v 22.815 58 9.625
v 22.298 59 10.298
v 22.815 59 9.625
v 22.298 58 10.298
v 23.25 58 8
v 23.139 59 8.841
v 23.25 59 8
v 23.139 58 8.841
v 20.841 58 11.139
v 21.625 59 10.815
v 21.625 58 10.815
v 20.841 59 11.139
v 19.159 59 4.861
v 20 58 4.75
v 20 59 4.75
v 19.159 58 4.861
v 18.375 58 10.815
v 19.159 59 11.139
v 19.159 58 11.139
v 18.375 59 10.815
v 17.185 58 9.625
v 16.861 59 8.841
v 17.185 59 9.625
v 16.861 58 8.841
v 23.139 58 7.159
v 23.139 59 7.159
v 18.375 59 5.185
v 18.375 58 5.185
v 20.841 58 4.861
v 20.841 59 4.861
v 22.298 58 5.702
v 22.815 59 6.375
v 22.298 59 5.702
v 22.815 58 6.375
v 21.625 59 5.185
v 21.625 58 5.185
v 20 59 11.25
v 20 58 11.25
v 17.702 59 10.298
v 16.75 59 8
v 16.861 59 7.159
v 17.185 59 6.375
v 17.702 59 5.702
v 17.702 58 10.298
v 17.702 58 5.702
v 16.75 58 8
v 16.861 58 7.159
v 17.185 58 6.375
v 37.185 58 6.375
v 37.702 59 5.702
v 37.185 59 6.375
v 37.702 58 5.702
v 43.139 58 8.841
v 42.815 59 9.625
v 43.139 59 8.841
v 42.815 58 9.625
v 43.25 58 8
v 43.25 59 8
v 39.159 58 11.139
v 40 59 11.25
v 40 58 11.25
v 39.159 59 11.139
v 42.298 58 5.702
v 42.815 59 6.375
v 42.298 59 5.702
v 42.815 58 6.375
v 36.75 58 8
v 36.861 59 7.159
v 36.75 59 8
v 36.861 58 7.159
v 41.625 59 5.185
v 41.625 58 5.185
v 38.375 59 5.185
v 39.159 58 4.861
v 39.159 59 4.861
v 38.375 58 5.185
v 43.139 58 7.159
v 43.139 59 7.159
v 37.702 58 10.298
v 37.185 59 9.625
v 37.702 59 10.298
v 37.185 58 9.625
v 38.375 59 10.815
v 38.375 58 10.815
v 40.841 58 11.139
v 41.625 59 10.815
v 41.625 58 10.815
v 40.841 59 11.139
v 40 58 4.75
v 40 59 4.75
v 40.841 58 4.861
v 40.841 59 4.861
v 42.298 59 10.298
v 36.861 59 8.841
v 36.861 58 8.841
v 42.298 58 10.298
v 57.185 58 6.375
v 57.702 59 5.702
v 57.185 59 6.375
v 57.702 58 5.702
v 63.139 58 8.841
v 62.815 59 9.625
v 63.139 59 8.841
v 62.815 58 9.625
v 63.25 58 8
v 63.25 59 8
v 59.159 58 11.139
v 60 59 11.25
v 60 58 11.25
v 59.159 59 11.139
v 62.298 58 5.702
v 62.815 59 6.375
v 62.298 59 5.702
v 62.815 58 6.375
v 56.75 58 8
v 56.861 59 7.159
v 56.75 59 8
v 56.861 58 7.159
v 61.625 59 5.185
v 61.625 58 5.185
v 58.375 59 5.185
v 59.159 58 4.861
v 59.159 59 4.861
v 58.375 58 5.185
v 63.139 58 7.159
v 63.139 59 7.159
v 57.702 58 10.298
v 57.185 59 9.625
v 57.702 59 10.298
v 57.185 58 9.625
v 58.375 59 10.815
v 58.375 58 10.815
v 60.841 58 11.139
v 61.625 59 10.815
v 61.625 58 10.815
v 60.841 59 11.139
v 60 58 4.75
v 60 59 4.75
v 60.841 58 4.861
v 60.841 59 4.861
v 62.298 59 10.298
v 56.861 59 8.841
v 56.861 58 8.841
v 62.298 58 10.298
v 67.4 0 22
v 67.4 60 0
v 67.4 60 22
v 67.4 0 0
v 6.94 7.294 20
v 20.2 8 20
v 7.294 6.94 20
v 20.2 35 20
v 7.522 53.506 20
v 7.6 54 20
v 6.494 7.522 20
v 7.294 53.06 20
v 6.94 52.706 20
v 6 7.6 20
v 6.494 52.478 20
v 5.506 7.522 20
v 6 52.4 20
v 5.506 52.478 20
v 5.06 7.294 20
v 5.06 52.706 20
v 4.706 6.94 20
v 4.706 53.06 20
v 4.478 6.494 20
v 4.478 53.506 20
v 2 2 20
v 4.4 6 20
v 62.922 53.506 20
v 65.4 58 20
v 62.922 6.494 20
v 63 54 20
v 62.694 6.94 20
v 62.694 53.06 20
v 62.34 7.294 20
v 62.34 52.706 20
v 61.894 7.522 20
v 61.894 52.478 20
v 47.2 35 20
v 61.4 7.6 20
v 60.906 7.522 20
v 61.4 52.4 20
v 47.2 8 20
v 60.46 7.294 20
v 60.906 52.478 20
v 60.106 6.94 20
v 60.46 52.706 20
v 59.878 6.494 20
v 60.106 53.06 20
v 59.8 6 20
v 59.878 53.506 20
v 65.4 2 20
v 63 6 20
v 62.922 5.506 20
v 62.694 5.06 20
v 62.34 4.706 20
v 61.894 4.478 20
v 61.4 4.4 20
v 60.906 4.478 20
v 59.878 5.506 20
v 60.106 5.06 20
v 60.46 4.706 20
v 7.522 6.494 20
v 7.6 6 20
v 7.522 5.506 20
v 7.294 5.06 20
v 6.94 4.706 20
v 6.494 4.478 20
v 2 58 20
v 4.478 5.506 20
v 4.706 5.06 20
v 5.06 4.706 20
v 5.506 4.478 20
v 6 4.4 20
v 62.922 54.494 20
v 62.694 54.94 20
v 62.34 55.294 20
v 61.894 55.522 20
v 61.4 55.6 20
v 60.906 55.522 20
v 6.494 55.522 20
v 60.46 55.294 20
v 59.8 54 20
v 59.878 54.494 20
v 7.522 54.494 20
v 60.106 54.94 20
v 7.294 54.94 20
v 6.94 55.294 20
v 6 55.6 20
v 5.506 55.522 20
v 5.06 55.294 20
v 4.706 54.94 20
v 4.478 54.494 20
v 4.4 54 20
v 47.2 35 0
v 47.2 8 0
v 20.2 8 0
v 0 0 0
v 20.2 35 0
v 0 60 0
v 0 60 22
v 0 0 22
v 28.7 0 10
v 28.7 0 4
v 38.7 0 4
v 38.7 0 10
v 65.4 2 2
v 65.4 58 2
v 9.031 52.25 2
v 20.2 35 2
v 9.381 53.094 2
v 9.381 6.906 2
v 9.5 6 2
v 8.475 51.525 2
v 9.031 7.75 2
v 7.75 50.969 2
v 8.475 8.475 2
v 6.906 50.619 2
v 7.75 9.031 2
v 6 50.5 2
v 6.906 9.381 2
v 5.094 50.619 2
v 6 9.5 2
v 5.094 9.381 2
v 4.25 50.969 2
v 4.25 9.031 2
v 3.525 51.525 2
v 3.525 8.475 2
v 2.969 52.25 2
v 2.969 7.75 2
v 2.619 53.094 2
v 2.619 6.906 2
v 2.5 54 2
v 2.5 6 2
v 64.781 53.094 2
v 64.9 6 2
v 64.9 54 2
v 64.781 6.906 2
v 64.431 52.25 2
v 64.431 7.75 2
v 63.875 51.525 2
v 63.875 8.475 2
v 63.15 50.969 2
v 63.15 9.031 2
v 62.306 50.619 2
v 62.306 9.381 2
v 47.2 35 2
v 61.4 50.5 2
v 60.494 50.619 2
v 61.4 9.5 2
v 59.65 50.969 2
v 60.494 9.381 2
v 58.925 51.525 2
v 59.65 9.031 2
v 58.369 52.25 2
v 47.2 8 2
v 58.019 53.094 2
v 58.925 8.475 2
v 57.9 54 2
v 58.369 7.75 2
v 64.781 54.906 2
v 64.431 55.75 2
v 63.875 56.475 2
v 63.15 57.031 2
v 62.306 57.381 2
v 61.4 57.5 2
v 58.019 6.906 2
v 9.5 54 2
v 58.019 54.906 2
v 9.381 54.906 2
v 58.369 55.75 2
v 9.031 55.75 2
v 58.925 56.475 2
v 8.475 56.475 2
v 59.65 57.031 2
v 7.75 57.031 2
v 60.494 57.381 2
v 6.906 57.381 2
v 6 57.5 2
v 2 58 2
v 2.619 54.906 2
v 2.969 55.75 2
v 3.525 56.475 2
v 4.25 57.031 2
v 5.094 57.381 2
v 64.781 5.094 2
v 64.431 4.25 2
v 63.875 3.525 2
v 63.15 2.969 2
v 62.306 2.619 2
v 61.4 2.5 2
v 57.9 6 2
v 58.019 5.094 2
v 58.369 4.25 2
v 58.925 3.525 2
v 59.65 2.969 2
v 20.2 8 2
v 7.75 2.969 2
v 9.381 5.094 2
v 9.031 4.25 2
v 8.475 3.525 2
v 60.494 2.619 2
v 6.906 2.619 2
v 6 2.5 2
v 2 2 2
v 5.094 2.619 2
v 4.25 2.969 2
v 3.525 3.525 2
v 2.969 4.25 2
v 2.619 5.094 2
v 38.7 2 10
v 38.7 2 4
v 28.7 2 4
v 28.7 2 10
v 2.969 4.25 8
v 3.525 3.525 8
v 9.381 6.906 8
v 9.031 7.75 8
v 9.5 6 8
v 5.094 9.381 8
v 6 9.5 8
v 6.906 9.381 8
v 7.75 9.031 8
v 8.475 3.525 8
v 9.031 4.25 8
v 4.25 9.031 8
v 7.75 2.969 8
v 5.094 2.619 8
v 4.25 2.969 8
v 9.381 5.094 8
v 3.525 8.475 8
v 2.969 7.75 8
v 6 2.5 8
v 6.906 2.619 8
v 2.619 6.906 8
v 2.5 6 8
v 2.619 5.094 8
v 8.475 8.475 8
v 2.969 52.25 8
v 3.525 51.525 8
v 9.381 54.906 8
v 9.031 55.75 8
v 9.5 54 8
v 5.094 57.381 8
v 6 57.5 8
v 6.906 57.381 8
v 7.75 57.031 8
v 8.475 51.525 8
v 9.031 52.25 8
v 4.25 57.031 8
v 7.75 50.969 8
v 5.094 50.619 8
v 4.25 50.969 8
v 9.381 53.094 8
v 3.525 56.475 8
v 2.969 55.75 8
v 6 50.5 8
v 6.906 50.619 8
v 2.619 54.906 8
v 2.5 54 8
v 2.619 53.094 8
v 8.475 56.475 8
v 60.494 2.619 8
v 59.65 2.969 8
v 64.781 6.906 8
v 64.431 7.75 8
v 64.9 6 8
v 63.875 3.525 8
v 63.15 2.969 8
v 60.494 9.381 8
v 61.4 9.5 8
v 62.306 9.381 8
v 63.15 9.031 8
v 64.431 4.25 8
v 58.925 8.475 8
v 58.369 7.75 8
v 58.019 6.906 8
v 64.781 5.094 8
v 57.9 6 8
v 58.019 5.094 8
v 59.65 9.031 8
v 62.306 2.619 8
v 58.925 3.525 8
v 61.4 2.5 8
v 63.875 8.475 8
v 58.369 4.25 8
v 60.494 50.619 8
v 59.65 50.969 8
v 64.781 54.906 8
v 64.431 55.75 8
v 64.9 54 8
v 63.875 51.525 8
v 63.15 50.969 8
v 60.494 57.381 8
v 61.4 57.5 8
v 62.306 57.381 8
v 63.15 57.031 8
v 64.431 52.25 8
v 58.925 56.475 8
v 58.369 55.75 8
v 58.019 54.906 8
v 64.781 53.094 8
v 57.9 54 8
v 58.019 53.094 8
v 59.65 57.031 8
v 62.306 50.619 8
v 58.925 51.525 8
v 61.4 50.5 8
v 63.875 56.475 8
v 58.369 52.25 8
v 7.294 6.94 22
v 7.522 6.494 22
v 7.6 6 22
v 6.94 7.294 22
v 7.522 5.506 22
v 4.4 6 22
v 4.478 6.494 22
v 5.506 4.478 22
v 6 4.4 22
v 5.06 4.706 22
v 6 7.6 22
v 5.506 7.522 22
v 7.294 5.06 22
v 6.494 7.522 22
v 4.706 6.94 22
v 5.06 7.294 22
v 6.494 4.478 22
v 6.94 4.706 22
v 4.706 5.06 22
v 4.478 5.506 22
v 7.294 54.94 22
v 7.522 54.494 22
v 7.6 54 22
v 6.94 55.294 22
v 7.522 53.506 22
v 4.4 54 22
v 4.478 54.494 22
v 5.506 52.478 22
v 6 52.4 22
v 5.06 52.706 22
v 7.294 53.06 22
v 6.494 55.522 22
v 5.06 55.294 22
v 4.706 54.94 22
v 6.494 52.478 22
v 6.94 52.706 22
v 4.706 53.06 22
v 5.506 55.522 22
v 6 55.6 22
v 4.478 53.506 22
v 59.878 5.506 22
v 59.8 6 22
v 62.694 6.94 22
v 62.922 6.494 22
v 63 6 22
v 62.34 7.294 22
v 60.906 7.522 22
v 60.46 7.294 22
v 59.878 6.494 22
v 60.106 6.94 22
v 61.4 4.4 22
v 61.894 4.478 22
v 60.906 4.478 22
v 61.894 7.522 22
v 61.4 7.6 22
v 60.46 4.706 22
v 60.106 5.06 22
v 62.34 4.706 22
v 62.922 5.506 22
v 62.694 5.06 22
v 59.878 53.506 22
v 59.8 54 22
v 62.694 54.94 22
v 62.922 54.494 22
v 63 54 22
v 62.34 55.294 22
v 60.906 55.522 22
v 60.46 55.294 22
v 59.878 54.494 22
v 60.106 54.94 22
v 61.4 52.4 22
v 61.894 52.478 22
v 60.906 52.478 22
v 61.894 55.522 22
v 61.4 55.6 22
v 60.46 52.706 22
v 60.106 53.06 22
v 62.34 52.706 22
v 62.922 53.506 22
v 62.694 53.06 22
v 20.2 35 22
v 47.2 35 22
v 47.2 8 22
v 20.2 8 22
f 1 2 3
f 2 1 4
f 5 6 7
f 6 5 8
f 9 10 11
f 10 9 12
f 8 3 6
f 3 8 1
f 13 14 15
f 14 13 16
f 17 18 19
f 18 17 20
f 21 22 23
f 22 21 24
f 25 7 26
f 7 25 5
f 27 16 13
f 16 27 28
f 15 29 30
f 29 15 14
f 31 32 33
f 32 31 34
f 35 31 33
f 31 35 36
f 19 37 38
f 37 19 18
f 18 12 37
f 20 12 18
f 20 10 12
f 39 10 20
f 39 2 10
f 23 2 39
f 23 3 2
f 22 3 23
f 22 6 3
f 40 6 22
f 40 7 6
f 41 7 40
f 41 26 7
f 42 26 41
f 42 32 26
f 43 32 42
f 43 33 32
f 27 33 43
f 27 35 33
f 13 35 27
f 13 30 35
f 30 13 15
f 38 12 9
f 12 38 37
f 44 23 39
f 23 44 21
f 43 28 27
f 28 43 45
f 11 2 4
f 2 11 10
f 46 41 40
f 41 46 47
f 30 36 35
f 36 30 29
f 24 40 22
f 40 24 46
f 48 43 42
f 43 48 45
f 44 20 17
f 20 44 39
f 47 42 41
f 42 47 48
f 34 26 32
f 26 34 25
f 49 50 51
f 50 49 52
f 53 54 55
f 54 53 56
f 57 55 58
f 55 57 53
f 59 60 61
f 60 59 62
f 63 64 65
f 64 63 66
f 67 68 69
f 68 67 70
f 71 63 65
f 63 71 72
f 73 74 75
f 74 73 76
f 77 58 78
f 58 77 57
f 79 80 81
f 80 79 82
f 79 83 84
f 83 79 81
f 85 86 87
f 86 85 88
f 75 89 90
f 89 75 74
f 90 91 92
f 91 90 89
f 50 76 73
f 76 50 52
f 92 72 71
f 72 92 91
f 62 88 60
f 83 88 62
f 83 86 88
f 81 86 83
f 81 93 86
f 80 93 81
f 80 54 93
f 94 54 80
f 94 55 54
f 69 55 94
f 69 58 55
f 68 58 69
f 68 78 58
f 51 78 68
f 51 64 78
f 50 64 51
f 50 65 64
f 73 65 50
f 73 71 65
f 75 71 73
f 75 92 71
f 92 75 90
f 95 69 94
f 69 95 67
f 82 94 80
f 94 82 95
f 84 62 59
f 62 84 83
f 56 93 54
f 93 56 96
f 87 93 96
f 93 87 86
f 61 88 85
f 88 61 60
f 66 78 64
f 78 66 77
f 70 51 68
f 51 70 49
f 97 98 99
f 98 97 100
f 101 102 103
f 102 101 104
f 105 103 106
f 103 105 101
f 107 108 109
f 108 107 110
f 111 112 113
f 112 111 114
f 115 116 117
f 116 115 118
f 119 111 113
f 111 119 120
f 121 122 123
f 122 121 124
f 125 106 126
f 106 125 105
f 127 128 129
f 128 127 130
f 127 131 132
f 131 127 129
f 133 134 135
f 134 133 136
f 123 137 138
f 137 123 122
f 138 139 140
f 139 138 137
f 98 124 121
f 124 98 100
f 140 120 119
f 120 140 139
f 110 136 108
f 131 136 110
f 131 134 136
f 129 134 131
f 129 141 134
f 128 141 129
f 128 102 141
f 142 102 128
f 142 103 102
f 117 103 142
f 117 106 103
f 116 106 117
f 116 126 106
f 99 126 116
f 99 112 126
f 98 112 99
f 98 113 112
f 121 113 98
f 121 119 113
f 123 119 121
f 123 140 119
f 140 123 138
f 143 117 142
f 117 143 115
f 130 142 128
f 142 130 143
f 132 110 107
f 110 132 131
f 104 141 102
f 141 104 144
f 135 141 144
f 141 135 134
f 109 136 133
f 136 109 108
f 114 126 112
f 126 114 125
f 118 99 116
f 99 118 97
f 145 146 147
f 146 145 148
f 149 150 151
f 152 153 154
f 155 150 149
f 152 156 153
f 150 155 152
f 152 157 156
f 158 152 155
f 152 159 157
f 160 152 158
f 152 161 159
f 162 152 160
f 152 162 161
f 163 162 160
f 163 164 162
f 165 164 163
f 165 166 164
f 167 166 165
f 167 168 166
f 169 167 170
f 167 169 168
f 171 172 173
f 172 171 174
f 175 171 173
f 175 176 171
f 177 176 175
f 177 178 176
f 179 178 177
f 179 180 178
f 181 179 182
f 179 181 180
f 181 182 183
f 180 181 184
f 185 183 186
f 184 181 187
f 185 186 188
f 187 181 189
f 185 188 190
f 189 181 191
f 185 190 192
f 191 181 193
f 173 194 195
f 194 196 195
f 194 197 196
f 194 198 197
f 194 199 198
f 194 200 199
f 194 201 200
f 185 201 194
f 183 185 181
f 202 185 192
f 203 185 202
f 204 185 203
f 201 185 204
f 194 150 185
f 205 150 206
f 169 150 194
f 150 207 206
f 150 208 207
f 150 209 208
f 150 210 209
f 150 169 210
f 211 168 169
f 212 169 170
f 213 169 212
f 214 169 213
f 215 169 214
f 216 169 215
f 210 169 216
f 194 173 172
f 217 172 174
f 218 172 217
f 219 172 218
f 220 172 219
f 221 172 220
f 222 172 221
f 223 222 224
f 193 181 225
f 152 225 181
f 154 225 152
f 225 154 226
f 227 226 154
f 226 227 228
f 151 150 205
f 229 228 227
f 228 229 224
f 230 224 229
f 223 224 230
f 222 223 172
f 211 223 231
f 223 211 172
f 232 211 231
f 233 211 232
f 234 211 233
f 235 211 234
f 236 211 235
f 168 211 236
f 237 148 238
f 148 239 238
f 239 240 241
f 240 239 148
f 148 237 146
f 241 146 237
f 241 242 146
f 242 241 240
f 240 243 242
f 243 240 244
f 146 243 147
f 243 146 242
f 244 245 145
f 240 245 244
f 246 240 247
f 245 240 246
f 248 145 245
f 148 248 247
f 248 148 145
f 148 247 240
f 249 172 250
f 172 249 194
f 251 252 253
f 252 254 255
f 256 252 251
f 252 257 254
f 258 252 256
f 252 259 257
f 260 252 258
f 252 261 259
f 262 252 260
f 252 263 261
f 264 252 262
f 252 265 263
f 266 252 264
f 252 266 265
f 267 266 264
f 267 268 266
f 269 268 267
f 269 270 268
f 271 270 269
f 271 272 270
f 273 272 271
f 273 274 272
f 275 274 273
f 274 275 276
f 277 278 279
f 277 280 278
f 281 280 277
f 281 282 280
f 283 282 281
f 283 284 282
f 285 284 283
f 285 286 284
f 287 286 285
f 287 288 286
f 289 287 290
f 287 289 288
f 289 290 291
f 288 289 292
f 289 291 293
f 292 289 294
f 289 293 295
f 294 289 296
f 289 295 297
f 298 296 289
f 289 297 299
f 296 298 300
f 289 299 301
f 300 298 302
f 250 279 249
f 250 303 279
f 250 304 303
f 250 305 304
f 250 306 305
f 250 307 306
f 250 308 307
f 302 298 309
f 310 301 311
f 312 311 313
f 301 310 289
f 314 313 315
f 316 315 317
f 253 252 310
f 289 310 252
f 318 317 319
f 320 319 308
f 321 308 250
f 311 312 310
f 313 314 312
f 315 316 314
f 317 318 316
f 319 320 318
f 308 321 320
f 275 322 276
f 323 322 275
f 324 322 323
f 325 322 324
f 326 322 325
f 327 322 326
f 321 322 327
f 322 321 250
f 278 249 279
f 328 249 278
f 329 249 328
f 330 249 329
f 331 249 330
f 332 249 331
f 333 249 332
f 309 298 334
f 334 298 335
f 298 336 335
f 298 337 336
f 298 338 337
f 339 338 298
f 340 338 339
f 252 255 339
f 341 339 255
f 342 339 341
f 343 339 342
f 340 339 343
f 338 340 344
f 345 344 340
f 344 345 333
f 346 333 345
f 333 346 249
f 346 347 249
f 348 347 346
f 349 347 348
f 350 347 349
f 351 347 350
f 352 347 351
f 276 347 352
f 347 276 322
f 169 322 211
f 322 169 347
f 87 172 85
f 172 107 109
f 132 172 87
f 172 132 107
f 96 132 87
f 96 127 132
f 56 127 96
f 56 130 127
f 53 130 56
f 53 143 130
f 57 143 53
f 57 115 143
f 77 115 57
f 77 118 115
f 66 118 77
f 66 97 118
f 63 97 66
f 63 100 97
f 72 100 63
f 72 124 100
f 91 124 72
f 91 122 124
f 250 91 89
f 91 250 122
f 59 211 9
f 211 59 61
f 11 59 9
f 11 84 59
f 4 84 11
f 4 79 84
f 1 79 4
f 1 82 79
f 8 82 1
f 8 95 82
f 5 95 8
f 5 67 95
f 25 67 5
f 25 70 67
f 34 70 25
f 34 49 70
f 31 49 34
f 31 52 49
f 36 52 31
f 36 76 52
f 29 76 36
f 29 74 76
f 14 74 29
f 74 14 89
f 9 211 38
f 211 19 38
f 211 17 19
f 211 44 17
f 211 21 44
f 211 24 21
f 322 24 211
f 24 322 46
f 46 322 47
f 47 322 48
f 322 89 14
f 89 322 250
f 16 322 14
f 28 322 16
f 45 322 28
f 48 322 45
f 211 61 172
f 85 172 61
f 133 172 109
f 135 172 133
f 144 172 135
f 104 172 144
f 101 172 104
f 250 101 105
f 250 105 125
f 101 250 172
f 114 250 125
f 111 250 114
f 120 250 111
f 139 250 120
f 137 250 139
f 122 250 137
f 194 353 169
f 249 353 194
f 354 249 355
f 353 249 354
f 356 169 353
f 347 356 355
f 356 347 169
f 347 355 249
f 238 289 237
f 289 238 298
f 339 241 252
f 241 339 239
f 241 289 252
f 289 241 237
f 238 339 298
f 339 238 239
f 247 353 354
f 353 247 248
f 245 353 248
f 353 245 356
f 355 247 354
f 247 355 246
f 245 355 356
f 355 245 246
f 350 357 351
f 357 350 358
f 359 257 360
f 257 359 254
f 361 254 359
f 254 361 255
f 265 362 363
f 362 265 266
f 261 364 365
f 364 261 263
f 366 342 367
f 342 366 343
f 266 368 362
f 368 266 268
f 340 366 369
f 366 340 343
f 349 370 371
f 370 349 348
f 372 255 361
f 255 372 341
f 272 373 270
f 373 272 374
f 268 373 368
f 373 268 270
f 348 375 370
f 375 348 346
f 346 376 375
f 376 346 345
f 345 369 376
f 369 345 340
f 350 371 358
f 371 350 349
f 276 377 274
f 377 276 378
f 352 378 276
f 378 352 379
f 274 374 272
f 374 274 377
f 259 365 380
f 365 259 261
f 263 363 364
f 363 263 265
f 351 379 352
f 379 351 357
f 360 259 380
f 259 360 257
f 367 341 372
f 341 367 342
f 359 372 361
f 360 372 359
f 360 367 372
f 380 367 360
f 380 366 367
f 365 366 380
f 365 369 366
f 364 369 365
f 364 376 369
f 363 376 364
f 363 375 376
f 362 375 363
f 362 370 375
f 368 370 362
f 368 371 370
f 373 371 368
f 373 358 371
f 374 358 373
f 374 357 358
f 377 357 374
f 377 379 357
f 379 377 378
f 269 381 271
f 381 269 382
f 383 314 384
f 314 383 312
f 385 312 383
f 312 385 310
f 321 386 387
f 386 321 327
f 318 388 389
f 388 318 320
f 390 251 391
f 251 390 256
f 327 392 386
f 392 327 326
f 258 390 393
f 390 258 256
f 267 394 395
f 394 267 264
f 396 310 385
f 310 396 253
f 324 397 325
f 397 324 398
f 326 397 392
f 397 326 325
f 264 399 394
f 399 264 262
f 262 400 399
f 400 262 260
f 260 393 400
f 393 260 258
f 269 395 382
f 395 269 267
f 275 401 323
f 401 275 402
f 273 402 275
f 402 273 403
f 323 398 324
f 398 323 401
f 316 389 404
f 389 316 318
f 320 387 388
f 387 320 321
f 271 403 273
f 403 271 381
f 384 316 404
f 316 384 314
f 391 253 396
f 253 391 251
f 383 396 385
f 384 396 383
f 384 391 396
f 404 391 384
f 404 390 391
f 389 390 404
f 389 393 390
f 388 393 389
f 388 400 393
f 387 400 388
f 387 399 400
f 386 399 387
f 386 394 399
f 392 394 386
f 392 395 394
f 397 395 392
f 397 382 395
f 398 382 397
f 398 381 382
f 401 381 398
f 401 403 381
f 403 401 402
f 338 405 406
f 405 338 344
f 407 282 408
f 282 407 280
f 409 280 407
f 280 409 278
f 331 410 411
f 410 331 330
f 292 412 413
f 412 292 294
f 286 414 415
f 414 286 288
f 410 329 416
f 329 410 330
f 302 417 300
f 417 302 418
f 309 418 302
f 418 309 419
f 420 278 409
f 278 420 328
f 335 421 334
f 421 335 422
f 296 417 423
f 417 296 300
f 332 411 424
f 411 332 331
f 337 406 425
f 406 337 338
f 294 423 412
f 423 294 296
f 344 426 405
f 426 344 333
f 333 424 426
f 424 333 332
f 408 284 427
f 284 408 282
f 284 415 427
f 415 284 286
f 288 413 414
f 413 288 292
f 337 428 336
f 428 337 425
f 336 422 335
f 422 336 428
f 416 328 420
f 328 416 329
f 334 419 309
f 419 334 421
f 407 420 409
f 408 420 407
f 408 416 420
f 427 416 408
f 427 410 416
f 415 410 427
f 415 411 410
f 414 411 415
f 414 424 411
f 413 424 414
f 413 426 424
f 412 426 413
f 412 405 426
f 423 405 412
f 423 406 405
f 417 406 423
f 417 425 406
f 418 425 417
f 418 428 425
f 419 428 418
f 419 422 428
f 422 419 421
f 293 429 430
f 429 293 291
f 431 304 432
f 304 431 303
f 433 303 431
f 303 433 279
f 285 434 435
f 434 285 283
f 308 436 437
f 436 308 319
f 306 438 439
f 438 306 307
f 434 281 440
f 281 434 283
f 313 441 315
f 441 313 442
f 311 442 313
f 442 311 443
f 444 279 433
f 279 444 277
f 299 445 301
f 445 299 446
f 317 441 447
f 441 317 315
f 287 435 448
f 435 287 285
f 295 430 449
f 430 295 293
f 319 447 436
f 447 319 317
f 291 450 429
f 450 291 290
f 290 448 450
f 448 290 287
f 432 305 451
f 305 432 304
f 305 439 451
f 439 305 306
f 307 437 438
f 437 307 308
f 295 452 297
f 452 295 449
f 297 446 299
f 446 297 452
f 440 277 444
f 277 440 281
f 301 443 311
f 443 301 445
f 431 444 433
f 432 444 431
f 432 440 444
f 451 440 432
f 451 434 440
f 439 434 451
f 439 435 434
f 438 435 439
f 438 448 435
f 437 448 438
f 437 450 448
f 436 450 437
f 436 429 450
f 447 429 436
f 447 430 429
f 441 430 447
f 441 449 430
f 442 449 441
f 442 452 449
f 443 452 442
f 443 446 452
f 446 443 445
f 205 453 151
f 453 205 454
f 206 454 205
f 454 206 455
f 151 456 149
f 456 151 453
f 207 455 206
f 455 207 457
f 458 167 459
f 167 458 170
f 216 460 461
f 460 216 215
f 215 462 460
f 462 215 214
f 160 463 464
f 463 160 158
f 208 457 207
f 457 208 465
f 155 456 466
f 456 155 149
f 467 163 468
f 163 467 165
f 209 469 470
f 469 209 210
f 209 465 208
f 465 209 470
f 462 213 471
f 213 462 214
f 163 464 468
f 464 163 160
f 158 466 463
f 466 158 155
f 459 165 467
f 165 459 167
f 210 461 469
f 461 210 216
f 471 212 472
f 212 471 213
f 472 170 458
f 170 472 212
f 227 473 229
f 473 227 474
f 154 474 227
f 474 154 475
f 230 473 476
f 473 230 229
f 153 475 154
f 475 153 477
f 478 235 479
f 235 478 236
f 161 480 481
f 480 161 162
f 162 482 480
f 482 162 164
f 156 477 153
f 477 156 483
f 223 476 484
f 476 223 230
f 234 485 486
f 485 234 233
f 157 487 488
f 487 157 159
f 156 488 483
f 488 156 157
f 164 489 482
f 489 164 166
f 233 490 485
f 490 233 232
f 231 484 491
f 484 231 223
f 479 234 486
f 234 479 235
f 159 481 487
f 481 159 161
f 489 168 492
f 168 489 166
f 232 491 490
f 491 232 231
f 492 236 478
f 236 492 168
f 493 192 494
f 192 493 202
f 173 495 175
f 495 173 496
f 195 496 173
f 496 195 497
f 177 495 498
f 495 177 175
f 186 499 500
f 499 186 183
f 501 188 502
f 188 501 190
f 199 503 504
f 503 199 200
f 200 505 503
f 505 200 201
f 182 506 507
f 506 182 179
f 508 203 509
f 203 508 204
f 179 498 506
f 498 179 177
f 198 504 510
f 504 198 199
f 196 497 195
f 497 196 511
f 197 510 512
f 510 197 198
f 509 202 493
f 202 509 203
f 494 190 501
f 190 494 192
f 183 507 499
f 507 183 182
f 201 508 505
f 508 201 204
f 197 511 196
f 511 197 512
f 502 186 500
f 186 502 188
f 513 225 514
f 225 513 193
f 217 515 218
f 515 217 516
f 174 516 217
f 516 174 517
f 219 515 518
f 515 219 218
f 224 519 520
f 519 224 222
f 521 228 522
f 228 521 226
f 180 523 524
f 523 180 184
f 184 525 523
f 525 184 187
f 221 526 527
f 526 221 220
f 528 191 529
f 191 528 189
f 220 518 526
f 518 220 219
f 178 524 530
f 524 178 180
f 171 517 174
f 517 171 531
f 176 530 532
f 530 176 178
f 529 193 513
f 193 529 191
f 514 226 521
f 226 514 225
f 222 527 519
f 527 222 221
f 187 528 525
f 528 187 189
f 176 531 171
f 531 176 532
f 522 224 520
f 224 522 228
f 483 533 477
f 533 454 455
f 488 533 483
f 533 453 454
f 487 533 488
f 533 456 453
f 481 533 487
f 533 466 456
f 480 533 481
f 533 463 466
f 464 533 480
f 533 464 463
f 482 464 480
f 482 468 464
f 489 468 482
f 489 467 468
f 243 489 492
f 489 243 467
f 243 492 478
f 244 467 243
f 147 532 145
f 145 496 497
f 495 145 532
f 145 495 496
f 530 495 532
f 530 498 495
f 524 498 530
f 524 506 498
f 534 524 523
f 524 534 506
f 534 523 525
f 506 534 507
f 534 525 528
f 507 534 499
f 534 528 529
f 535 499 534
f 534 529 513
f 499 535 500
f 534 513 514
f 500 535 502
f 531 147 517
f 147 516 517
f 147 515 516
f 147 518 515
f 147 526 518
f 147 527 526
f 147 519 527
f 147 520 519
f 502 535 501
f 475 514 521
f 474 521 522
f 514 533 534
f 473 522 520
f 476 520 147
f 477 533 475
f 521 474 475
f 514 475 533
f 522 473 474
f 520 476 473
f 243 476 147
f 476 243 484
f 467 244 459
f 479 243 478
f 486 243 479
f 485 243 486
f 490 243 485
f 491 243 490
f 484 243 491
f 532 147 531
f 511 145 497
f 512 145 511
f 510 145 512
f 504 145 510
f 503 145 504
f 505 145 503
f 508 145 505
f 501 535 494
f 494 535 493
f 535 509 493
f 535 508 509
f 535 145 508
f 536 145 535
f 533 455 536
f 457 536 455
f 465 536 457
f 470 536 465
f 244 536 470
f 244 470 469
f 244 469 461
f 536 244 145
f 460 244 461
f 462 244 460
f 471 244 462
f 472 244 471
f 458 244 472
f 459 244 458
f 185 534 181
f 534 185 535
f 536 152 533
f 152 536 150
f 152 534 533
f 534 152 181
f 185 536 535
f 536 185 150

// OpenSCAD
// case.scad — OpenSCAD parametric controller case.
// 가정(명시): Pico 51x21mm, OLED 27x27mm, M3 나사, 공차 0.2mm.
// 슬라이서 검증 없음. STL은 이 파일에서 파생된 간이 형상(VERIFICATION.md 참고).

tol = 0.2;
pico_l = 51; pico_w = 21;
oled = 27;
wall = 2;
inner_l = pico_l + 12 + tol*2;
inner_w = 56;
inner_h = 18;
M3 = 3.2; // clearance hole

module box() {
  difference() {
    cube([inner_l + wall*2, inner_w + wall*2, inner_h + wall]);
    translate([wall, wall, wall]) cube([inner_l, inner_w, inner_h+1]);
    // OLED window (top, z = 0 base -> cut through lid separately; hole in body side for view)
    translate([(inner_l+wall*2)/2 - oled/2, 8, -1]) cube([oled, oled, wall+2]);
    // button holes (3x 6mm tact -> 6.5mm holes)
    for (x = [20, 40, 60])
      translate([x, inner_w + wall*2 - 1, 8]) rotate([90,0,0]) cylinder(d=6.5, h=wall+2, $fn=24);
    // micro usb slot (front)
    translate([(inner_l+wall*2)/2 - 5, -1, 4]) cube([10, wall+2, 6]);
  }
  // M3 posts
  for (x = [wall+4, inner_l+wall-4], y = [wall+4, inner_w+wall-4])
    translate([x, y, wall]) cylinder(d=7, h=6, $fn=24);
}

module lid() {
  difference() {
    translate([0, 0, inner_h + wall]) cube([inner_l + wall*2, inner_w + wall*2, wall]);
    translate([(inner_l+wall*2)/2 - oled/2, 8, inner_h + wall - 1]) cube([oled, oled, wall+2]);
    for (x = [wall+4, inner_l+wall-4], y = [wall+4, inner_w+wall-4])
      translate([x, y, inner_h + wall - 1]) cylinder(d=M3, h=wall+2, $fn=20);
  }
}

box();
translate([0, 0, 0]) lid();
